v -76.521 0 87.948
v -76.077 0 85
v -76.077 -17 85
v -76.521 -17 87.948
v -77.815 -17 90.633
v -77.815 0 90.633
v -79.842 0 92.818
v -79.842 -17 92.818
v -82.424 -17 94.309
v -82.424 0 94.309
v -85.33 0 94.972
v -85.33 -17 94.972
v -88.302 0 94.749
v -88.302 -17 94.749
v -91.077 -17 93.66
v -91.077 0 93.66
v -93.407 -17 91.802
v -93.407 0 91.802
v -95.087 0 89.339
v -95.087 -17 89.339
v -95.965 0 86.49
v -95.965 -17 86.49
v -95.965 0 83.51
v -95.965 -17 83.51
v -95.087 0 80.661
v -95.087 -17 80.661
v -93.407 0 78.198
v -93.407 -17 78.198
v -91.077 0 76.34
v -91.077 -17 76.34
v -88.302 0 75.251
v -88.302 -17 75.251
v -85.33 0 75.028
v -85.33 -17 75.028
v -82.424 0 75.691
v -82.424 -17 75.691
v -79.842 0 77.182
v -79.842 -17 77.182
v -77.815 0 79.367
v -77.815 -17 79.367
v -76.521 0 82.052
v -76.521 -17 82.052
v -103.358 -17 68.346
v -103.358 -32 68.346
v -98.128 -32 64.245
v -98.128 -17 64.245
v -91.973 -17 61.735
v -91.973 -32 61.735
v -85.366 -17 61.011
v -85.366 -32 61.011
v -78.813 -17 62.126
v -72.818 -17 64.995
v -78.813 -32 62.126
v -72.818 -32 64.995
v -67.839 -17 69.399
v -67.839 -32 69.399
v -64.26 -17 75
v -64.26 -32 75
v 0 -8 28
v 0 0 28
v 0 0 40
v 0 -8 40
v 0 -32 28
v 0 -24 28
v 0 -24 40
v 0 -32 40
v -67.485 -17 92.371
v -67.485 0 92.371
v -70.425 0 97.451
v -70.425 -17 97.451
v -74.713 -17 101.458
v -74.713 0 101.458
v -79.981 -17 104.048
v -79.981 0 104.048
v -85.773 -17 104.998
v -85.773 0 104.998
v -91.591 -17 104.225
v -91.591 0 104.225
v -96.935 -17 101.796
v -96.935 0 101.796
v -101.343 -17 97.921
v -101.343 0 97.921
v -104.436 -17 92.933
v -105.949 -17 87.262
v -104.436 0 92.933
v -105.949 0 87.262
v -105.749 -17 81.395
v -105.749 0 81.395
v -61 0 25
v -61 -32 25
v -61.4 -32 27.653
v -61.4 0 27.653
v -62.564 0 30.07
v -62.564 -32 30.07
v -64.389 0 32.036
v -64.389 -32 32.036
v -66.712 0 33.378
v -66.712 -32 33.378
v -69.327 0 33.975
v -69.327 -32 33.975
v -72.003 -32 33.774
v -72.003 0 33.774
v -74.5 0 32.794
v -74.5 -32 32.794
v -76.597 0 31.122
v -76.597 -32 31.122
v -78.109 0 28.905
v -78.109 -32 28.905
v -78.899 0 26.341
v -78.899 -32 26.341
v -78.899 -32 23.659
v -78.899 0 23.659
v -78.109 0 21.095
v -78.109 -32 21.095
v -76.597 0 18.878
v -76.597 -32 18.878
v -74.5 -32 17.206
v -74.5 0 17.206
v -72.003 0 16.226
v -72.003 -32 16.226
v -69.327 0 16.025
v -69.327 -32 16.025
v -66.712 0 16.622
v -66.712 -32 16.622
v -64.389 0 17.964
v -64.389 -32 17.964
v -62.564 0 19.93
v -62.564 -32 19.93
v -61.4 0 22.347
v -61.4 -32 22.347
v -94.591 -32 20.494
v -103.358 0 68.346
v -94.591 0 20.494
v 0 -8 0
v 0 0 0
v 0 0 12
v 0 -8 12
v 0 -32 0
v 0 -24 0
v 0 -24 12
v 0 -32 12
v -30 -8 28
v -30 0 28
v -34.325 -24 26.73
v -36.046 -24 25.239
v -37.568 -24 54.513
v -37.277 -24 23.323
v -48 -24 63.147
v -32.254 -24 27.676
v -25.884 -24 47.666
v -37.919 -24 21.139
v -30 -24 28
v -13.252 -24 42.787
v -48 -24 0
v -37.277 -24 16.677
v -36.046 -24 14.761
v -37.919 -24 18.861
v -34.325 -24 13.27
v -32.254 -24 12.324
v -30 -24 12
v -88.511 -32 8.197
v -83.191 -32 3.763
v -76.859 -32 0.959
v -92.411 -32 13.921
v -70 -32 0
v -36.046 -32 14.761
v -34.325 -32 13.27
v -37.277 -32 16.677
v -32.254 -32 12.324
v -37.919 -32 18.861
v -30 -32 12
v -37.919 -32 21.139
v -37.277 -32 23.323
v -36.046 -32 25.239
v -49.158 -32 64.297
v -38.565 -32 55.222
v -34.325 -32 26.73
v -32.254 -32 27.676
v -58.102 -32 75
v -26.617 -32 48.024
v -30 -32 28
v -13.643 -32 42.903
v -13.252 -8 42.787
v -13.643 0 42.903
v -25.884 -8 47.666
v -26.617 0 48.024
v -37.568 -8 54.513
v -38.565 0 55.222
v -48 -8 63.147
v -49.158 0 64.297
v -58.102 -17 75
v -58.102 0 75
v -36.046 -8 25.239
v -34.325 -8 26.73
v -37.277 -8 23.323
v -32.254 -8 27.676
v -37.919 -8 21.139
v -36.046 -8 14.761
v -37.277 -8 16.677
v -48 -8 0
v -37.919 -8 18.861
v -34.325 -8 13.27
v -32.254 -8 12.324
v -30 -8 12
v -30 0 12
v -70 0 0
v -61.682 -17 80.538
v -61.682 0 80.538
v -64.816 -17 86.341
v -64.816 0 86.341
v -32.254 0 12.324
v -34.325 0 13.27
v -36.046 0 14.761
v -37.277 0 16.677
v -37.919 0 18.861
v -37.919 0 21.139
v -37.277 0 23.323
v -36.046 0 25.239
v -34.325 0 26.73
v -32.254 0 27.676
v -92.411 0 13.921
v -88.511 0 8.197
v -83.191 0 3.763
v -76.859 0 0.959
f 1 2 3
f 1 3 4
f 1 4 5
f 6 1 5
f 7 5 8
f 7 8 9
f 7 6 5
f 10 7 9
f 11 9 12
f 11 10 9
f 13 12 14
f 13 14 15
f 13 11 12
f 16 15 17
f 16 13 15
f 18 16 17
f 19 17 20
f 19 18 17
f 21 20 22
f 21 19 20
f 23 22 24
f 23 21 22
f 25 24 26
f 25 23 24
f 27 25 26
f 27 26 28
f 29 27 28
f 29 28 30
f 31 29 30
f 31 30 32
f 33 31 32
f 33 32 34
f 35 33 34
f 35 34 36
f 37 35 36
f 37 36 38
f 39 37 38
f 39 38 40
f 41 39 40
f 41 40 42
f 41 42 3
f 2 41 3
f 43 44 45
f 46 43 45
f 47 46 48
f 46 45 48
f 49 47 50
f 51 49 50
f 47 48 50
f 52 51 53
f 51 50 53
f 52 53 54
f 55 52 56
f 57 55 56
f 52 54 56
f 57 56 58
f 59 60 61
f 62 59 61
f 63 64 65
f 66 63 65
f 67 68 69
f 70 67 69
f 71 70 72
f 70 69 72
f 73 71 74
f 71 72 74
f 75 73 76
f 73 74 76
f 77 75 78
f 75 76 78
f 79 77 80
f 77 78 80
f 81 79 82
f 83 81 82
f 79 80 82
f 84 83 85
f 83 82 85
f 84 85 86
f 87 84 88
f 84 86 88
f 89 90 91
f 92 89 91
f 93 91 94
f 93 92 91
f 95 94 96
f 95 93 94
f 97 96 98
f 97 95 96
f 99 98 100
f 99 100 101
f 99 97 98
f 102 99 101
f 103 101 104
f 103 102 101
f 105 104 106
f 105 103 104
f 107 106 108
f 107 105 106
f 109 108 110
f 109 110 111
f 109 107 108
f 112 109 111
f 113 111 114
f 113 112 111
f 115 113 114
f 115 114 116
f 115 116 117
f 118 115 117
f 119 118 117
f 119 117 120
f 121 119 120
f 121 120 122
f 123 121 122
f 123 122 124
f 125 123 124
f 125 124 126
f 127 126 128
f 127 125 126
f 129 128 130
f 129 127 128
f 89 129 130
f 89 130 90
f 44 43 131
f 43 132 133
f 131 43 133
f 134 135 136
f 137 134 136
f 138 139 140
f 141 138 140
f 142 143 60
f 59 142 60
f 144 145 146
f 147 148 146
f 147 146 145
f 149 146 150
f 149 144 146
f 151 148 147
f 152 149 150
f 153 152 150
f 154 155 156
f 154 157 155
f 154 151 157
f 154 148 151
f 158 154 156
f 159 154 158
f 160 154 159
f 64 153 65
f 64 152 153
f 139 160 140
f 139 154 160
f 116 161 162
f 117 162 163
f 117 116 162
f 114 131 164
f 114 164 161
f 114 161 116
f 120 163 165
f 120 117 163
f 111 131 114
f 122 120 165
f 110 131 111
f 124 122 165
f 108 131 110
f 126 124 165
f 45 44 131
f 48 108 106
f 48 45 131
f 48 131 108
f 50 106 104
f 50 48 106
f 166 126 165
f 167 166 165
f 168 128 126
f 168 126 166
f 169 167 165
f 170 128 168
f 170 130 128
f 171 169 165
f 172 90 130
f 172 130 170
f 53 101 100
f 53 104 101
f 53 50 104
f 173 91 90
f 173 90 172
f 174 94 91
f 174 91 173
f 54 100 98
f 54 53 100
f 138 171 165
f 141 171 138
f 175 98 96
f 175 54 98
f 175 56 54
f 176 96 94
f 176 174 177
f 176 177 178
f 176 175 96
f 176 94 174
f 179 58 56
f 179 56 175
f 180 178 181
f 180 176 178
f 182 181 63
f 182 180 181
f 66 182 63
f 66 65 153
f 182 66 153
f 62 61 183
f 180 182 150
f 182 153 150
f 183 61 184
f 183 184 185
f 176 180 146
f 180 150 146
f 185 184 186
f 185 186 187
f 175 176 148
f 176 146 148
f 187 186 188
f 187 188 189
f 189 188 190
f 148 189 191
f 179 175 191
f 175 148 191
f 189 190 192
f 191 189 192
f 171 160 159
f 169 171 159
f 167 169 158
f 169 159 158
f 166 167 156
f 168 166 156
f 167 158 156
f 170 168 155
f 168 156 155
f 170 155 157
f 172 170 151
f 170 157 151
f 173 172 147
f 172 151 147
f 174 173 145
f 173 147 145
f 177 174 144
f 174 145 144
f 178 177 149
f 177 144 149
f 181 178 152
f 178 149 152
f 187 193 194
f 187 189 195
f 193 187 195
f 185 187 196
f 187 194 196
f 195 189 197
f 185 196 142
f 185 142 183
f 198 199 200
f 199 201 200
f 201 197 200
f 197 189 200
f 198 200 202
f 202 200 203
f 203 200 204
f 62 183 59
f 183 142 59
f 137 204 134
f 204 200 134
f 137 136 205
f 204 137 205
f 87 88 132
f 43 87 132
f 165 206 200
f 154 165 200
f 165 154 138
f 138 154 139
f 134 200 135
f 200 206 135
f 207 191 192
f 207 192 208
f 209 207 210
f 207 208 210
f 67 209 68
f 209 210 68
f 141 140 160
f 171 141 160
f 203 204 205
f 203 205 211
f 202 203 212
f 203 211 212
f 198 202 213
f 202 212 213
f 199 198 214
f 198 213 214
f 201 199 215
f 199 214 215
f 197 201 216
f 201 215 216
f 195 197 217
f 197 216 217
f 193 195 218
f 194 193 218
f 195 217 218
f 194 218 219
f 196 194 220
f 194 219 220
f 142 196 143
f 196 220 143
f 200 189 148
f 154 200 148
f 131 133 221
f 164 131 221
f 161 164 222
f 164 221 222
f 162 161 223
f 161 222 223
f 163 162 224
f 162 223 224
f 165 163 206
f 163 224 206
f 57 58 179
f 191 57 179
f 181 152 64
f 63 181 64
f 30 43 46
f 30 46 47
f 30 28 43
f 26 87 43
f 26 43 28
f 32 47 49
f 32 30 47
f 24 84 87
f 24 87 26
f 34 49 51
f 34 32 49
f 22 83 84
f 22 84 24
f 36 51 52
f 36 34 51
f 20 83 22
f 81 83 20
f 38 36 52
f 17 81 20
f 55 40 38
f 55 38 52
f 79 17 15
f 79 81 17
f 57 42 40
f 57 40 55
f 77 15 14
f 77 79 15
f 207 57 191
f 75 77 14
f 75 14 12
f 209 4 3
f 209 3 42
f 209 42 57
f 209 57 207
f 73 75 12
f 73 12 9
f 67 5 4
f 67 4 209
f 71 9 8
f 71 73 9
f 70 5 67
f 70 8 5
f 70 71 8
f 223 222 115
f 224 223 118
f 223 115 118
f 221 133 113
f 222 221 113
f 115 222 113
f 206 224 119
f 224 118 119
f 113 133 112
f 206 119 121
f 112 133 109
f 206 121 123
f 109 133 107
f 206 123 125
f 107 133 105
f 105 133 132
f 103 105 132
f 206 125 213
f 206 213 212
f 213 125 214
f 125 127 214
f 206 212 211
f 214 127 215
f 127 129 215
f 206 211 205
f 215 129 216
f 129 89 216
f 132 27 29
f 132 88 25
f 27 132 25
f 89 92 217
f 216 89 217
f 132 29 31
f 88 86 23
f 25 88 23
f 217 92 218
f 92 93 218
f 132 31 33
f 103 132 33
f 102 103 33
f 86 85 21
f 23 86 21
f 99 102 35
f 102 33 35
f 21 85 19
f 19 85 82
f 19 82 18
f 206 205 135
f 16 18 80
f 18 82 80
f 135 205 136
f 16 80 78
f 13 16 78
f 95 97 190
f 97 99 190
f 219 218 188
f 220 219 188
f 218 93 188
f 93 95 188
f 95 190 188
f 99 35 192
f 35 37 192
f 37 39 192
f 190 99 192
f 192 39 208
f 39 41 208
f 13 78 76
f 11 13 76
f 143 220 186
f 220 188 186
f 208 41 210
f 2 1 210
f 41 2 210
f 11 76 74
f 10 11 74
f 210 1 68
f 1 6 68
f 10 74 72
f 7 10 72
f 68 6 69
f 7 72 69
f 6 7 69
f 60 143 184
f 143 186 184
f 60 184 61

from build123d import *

# Parameters (mm, degrees)
F0_R     = 9
F0_R_2   = 10
F1_DEPTH = 32
F2_R     = 10
F3_DEPTH = 15
F4_W     = 48
F4_H     = 16
F5_DEPTH = 105.001


with BuildPart() as f1:
    # F0 (on Front) → F1 (new body)
    with BuildSketch(Plane.XZ):
        with BuildLine():
            Line((-70, 0), (0, 0))
            Line((0, 0), (0, 12))
            Line((0, 12), (-30, 12))
            ThreePointArc((-30, 12), (-38, 20), (-30, 28))
            Line((-30, 28), (0, 28))
            Line((0, 28), (0, 40))
            ThreePointArc((0, 40), (-32.741064, 51.374572), (-58.1024, 75))
            Line((-58.1024, 75), (-64.259527, 75))
            ThreePointArc((-64.259527, 75), (-82.050541, 61.34016), (-103.358452, 68.346179))
            Line((-103.358452, 68.346179), (-94.590621, 20.494296))
            ThreePointArc((-94.590621, 20.494296), (-86.005584, 5.795279), (-70, 0))
        make_face()
        with Locations((-70, 25)):
            Circle(F0_R, mode=Mode.SUBTRACT)
        with BuildLine():
            Line((-105.749448, 81.395437), (-103.358452, 68.346179))
            ThreePointArc((-103.358452, 68.346179), (-82.050541, 61.34016), (-64.259527, 75))
            Line((-64.259527, 75), (-58.1024, 75))
            ThreePointArc((-58.1024, 75), (-63.305667, 83.4088), (-67.484714, 92.370801))
            ThreePointArc((-67.484714, 92.370801), (-91.591151, 104.224817), (-105.749448, 81.395437))
        make_face()
        with Locations((-86.076952, 85)):
            Circle(F0_R_2, mode=Mode.SUBTRACT)
    extrude(amount=F1_DEPTH)

    # F2 (on face) → F3 (cut)
    with BuildSketch(Plane.XZ.offset(32)):
        with BuildLine():
            ThreePointArc((-67.484714, 92.370801), (-91.591151, 104.224817), (-105.749448, 81.395437))
            Line((-105.749448, 81.395437), (-103.358452, 68.346179))
            ThreePointArc((-103.358452, 68.346179), (-82.050541, 61.34016), (-64.259527, 75))
            Line((-64.259527, 75), (-58.1024, 75))
            ThreePointArc((-58.1024, 75), (-63.305667, 83.4088), (-67.484714, 92.370801))
        make_face()
        with Locations((-86.076952, 85)):
            Circle(F2_R, mode=Mode.SUBTRACT)
    extrude(amount=-F3_DEPTH, mode=Mode.SUBTRACT)

    # F4 (on face) → F5 (cut, through all)
    with BuildSketch(Plane(origin=(0, 0, 0), x_dir=(1, 0, 0), z_dir=(0, 0, -1))):
        with Locations((-24, 16)):
            Rectangle(F4_W, F4_H)
    extrude(amount=-F5_DEPTH, mode=Mode.SUBTRACT)


solid = f1.part
